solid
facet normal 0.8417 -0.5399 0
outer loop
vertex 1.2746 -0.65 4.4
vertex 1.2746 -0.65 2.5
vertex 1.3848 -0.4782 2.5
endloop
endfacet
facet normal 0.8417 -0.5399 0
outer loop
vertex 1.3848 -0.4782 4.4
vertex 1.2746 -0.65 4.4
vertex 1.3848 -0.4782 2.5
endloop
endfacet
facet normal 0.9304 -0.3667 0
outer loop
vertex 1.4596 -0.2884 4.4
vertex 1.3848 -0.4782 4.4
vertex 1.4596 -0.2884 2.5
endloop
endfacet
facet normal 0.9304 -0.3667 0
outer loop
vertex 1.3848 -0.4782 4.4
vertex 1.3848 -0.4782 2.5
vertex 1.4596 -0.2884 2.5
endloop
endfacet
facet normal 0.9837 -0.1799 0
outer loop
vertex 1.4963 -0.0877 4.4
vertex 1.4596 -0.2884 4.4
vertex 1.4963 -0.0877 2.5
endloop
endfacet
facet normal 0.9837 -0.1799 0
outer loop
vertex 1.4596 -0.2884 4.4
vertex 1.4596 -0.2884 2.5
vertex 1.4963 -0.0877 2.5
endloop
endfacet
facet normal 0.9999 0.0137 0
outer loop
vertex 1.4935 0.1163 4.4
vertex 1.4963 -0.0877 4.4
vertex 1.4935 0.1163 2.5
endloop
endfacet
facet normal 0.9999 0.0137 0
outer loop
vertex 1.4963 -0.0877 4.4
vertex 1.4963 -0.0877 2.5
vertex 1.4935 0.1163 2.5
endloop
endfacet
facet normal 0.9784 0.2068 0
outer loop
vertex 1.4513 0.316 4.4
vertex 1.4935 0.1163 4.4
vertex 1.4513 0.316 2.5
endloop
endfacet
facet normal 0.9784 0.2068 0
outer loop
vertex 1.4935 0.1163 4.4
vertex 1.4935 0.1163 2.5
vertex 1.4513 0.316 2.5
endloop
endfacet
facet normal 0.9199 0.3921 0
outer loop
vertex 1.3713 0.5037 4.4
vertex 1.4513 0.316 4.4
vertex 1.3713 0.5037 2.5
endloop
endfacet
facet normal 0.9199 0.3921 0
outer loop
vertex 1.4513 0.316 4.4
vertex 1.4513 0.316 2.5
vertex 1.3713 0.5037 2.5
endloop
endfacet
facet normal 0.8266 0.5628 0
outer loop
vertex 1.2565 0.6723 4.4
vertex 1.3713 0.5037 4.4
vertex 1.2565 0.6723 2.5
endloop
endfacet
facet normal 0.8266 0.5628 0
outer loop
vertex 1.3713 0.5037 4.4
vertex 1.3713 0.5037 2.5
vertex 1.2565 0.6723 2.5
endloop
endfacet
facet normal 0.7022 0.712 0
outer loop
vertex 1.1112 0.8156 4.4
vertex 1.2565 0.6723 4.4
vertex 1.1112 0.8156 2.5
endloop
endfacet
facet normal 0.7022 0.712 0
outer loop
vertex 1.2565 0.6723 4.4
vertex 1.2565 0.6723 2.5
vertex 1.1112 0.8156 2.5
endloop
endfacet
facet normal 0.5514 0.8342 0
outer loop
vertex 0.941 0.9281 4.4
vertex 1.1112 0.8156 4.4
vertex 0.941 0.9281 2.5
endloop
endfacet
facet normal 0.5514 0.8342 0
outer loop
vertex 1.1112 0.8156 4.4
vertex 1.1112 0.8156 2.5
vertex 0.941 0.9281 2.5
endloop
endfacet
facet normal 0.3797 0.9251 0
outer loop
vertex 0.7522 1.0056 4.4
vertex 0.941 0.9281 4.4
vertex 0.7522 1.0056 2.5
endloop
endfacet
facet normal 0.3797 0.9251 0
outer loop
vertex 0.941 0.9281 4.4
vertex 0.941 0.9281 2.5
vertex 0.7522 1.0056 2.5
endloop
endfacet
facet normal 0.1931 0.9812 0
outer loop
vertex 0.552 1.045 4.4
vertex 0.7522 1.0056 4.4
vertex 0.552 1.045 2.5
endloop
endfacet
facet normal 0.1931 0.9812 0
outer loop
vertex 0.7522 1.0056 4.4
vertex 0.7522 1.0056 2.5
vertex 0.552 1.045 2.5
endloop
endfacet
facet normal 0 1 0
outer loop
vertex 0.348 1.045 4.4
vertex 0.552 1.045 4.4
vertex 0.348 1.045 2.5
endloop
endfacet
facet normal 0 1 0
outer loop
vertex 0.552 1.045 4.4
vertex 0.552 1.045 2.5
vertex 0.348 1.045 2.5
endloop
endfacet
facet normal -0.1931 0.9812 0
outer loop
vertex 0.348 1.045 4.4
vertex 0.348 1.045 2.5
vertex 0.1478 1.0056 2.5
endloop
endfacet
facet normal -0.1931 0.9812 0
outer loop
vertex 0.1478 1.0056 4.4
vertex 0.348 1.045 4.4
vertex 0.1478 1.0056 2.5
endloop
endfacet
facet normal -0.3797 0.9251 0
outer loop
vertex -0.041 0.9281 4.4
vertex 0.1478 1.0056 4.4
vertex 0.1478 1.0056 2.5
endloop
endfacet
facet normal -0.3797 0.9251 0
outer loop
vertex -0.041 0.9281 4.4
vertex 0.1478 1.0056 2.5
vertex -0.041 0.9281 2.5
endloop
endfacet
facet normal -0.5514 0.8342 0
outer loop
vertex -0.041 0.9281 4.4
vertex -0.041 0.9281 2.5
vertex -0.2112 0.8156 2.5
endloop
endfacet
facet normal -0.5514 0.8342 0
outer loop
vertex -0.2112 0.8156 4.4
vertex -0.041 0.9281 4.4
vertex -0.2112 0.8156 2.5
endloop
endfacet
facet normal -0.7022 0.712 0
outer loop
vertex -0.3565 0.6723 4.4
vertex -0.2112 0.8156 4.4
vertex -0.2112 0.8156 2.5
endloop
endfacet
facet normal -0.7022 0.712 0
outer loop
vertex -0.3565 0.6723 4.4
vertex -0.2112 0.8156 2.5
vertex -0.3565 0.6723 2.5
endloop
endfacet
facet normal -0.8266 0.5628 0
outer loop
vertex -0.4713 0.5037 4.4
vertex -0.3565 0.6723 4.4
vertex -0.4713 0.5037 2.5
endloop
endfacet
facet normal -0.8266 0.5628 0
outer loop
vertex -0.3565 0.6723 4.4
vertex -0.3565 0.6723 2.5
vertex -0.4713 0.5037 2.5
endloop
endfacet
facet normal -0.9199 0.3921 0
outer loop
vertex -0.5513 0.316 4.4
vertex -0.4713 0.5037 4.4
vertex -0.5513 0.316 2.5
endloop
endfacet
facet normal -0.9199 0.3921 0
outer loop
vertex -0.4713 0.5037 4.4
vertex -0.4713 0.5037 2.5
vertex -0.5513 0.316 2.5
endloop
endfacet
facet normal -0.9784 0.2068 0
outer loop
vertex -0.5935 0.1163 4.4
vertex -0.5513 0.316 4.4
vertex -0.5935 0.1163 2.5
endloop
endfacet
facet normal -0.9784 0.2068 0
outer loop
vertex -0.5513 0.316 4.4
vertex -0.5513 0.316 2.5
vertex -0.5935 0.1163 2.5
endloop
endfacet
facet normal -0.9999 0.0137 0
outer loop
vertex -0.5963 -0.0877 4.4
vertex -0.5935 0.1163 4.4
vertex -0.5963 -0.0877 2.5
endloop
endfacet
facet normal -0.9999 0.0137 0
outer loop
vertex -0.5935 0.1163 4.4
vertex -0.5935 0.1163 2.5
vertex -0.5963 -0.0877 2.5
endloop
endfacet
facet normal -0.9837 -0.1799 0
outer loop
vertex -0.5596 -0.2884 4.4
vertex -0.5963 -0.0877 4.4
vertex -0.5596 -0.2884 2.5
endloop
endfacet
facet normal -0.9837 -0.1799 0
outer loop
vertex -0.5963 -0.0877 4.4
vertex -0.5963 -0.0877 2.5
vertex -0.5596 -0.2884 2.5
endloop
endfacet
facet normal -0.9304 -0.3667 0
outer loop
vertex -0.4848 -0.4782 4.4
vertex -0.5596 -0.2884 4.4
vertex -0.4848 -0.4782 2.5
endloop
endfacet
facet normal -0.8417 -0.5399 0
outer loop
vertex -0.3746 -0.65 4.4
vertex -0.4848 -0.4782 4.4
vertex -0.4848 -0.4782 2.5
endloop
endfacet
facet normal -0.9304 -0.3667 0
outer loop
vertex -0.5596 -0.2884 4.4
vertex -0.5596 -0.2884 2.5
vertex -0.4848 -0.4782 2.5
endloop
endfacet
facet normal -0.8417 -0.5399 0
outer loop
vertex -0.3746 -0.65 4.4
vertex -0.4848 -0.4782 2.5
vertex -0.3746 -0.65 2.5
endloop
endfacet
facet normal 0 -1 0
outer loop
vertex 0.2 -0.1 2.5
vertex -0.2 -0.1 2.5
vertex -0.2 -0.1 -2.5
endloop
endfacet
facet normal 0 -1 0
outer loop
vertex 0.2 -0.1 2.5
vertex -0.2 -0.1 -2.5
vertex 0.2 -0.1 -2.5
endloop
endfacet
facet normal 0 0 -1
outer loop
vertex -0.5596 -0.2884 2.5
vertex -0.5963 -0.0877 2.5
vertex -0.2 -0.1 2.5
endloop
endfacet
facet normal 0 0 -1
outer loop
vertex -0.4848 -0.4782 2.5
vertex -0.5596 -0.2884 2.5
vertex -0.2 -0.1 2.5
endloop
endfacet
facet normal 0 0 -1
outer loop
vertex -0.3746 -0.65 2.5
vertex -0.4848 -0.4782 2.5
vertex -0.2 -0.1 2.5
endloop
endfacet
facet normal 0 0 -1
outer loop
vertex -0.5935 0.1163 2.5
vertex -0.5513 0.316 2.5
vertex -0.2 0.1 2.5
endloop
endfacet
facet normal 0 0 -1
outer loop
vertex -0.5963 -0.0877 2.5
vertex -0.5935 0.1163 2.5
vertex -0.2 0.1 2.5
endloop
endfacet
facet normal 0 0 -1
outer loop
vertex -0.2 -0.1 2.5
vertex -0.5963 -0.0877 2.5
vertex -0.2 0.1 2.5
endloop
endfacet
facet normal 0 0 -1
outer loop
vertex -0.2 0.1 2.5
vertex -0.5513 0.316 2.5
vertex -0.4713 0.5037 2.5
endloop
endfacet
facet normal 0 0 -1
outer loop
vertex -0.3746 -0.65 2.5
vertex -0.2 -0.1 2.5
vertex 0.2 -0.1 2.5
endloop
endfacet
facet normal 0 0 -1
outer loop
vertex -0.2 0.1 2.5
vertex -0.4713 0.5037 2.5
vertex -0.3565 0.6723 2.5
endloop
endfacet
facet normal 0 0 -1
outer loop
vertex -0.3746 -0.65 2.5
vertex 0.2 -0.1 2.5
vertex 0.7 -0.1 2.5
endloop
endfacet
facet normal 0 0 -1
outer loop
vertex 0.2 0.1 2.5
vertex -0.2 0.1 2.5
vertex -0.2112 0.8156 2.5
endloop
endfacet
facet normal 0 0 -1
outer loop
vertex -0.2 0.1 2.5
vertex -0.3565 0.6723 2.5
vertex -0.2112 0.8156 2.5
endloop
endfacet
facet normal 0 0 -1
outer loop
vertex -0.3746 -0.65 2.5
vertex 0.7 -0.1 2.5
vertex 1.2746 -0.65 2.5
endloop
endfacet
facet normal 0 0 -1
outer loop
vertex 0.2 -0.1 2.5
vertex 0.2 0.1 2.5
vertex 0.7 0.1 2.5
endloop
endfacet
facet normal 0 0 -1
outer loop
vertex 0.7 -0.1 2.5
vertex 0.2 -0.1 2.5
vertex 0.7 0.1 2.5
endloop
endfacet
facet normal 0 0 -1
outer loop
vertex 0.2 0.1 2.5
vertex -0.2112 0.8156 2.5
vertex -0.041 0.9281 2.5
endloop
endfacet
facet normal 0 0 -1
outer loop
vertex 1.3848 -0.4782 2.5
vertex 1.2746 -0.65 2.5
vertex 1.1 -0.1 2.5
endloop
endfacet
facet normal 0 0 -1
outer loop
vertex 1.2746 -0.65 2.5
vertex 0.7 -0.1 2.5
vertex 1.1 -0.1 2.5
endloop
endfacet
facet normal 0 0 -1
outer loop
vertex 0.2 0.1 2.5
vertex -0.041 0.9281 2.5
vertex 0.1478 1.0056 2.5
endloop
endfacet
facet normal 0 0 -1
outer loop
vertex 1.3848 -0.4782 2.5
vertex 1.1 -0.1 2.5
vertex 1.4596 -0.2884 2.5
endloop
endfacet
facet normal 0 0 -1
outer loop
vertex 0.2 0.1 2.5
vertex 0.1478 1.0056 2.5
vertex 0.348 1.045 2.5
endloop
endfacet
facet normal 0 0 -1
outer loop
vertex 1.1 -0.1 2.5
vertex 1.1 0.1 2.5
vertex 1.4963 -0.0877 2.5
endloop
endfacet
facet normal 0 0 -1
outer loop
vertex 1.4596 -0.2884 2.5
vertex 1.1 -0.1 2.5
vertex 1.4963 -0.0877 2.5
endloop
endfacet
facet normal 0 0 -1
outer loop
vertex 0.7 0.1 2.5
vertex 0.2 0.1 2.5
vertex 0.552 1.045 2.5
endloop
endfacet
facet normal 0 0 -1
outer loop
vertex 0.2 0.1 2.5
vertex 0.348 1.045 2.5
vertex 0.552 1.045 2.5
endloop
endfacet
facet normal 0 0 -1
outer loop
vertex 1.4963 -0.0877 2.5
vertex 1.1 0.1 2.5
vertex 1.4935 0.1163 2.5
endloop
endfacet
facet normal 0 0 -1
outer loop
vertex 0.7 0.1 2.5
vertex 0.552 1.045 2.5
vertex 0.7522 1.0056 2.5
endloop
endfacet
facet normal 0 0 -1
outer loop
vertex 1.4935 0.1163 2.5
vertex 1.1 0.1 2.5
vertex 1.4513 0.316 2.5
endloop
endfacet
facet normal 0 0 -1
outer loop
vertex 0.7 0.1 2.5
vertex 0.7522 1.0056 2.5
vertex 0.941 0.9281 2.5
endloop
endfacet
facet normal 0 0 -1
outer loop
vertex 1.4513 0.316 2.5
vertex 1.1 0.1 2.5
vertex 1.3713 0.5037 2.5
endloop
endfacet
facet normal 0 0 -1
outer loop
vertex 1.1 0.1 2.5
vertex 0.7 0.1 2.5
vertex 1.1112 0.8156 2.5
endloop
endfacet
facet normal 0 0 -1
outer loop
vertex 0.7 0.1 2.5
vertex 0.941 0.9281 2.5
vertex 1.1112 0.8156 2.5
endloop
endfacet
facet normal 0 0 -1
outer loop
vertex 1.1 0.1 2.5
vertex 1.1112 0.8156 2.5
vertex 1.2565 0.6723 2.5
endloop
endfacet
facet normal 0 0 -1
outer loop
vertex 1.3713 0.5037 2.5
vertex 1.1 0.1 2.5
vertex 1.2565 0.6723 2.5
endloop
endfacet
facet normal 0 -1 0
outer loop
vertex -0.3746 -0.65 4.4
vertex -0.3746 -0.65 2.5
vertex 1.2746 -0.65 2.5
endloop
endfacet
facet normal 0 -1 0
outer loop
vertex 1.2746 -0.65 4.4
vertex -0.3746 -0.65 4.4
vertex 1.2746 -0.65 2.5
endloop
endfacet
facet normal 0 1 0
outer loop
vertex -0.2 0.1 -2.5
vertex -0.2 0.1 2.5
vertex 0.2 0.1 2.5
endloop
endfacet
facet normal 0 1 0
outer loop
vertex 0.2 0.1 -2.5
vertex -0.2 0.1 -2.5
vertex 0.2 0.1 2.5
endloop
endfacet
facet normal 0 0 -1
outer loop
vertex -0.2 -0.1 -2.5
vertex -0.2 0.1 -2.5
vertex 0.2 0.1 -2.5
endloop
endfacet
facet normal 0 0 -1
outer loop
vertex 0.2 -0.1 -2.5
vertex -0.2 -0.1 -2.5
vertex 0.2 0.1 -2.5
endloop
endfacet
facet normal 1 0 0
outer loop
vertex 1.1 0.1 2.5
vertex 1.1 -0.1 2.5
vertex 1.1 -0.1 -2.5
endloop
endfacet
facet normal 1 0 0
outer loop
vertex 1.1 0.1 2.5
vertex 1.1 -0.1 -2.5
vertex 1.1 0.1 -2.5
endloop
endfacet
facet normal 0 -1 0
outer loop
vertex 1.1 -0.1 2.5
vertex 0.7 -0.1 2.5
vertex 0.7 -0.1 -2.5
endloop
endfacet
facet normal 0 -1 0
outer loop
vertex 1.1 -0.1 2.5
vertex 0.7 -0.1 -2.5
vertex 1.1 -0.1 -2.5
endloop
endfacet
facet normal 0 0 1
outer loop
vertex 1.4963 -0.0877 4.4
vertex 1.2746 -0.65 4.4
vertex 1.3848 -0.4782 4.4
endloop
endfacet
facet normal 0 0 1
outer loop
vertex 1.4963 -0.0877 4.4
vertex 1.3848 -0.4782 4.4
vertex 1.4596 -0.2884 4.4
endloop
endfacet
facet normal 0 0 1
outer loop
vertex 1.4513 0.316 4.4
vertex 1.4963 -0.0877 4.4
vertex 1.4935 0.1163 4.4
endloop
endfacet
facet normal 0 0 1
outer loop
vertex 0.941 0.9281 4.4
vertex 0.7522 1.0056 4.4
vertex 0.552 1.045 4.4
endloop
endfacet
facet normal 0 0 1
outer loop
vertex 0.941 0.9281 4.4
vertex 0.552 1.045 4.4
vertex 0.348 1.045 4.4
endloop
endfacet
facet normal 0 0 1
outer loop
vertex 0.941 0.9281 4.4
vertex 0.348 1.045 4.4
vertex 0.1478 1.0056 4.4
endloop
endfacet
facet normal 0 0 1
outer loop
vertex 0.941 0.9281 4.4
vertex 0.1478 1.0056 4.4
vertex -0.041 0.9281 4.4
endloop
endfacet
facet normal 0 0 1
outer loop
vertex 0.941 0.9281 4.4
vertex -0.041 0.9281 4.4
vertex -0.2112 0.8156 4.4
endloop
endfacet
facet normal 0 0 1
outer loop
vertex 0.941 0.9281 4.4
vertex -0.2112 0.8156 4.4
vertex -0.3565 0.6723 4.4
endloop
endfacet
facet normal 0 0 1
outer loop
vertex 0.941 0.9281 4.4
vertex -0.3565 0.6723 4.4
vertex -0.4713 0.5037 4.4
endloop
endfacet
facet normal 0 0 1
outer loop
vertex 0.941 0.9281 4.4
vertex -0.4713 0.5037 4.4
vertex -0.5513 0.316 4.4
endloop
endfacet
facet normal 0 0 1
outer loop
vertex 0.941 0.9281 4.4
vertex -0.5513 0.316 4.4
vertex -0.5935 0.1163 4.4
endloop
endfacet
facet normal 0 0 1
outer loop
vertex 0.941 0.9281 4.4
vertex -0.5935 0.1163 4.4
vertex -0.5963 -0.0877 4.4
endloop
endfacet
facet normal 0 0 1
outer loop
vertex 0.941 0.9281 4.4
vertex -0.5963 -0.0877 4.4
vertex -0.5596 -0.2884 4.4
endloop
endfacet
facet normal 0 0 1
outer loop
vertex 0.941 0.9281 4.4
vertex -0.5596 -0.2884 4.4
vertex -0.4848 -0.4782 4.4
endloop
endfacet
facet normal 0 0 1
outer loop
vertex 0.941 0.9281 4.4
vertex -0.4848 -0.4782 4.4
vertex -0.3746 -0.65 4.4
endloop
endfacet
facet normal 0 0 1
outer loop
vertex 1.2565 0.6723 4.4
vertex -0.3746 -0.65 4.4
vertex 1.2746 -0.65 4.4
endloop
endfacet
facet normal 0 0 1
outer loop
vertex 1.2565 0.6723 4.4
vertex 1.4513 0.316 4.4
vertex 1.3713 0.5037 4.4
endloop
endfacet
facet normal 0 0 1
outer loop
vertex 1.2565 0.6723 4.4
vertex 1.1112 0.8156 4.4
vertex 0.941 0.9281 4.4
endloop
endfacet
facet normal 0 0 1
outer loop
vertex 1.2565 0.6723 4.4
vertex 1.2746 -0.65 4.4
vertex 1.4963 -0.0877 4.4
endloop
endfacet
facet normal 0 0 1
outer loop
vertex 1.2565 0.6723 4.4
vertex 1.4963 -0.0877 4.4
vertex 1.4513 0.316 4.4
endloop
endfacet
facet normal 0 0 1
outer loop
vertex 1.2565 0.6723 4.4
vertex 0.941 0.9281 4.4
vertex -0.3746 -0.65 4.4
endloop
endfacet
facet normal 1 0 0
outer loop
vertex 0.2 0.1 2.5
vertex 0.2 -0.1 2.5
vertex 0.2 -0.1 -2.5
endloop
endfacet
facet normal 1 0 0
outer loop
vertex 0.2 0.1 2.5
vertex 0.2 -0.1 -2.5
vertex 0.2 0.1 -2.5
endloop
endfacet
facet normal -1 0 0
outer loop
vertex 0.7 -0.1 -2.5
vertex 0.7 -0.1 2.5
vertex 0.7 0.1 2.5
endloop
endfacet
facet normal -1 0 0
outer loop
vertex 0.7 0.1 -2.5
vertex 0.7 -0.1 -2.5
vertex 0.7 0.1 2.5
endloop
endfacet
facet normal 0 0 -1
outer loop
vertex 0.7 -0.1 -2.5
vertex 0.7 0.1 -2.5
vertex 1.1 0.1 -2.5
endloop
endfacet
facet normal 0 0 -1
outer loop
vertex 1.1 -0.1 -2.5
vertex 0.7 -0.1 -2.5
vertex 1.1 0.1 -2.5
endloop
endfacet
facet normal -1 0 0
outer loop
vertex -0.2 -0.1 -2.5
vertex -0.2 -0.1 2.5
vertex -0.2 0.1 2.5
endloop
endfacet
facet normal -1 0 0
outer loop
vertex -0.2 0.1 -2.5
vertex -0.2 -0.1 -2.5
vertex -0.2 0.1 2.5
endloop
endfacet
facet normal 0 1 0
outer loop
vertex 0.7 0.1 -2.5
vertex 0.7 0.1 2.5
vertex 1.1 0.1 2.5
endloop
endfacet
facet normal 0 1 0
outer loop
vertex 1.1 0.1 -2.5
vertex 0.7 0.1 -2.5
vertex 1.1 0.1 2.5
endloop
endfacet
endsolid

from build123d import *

# Parameters (mm, degrees)
SKETCH001_W  = 0.4
SKETCH001_H  = 0.2
PAD001_DEPTH = 5
PAD_DEPTH    = 1.9


with BuildPart() as pad001:
    # Sketch001 → Pad001 (new body)
    with BuildSketch(Plane.XY.offset(2.5)):
        Rectangle(SKETCH001_W, SKETCH001_H)
        with Locations((0.9, 0)):
            Rectangle(SKETCH001_W, SKETCH001_H)
    extrude(amount=-PAD001_DEPTH)


with BuildPart() as pad_mp_cp:
    # Sketch → Pad (new body)
    with BuildSketch(Plane.XY.offset(2.5)):
        with BuildLine():
            Line((-0.374621, -0.65), (1.274621, -0.65))
            ThreePointArc((1.274621, -0.65), (0.45, 1.05), (-0.374621, -0.65))
        make_face()
    extrude(amount=PAD_DEPTH)

    # Pad_mp_cp: union Pad001
    add(pad001.part)


solid = pad_mp_cp.part
